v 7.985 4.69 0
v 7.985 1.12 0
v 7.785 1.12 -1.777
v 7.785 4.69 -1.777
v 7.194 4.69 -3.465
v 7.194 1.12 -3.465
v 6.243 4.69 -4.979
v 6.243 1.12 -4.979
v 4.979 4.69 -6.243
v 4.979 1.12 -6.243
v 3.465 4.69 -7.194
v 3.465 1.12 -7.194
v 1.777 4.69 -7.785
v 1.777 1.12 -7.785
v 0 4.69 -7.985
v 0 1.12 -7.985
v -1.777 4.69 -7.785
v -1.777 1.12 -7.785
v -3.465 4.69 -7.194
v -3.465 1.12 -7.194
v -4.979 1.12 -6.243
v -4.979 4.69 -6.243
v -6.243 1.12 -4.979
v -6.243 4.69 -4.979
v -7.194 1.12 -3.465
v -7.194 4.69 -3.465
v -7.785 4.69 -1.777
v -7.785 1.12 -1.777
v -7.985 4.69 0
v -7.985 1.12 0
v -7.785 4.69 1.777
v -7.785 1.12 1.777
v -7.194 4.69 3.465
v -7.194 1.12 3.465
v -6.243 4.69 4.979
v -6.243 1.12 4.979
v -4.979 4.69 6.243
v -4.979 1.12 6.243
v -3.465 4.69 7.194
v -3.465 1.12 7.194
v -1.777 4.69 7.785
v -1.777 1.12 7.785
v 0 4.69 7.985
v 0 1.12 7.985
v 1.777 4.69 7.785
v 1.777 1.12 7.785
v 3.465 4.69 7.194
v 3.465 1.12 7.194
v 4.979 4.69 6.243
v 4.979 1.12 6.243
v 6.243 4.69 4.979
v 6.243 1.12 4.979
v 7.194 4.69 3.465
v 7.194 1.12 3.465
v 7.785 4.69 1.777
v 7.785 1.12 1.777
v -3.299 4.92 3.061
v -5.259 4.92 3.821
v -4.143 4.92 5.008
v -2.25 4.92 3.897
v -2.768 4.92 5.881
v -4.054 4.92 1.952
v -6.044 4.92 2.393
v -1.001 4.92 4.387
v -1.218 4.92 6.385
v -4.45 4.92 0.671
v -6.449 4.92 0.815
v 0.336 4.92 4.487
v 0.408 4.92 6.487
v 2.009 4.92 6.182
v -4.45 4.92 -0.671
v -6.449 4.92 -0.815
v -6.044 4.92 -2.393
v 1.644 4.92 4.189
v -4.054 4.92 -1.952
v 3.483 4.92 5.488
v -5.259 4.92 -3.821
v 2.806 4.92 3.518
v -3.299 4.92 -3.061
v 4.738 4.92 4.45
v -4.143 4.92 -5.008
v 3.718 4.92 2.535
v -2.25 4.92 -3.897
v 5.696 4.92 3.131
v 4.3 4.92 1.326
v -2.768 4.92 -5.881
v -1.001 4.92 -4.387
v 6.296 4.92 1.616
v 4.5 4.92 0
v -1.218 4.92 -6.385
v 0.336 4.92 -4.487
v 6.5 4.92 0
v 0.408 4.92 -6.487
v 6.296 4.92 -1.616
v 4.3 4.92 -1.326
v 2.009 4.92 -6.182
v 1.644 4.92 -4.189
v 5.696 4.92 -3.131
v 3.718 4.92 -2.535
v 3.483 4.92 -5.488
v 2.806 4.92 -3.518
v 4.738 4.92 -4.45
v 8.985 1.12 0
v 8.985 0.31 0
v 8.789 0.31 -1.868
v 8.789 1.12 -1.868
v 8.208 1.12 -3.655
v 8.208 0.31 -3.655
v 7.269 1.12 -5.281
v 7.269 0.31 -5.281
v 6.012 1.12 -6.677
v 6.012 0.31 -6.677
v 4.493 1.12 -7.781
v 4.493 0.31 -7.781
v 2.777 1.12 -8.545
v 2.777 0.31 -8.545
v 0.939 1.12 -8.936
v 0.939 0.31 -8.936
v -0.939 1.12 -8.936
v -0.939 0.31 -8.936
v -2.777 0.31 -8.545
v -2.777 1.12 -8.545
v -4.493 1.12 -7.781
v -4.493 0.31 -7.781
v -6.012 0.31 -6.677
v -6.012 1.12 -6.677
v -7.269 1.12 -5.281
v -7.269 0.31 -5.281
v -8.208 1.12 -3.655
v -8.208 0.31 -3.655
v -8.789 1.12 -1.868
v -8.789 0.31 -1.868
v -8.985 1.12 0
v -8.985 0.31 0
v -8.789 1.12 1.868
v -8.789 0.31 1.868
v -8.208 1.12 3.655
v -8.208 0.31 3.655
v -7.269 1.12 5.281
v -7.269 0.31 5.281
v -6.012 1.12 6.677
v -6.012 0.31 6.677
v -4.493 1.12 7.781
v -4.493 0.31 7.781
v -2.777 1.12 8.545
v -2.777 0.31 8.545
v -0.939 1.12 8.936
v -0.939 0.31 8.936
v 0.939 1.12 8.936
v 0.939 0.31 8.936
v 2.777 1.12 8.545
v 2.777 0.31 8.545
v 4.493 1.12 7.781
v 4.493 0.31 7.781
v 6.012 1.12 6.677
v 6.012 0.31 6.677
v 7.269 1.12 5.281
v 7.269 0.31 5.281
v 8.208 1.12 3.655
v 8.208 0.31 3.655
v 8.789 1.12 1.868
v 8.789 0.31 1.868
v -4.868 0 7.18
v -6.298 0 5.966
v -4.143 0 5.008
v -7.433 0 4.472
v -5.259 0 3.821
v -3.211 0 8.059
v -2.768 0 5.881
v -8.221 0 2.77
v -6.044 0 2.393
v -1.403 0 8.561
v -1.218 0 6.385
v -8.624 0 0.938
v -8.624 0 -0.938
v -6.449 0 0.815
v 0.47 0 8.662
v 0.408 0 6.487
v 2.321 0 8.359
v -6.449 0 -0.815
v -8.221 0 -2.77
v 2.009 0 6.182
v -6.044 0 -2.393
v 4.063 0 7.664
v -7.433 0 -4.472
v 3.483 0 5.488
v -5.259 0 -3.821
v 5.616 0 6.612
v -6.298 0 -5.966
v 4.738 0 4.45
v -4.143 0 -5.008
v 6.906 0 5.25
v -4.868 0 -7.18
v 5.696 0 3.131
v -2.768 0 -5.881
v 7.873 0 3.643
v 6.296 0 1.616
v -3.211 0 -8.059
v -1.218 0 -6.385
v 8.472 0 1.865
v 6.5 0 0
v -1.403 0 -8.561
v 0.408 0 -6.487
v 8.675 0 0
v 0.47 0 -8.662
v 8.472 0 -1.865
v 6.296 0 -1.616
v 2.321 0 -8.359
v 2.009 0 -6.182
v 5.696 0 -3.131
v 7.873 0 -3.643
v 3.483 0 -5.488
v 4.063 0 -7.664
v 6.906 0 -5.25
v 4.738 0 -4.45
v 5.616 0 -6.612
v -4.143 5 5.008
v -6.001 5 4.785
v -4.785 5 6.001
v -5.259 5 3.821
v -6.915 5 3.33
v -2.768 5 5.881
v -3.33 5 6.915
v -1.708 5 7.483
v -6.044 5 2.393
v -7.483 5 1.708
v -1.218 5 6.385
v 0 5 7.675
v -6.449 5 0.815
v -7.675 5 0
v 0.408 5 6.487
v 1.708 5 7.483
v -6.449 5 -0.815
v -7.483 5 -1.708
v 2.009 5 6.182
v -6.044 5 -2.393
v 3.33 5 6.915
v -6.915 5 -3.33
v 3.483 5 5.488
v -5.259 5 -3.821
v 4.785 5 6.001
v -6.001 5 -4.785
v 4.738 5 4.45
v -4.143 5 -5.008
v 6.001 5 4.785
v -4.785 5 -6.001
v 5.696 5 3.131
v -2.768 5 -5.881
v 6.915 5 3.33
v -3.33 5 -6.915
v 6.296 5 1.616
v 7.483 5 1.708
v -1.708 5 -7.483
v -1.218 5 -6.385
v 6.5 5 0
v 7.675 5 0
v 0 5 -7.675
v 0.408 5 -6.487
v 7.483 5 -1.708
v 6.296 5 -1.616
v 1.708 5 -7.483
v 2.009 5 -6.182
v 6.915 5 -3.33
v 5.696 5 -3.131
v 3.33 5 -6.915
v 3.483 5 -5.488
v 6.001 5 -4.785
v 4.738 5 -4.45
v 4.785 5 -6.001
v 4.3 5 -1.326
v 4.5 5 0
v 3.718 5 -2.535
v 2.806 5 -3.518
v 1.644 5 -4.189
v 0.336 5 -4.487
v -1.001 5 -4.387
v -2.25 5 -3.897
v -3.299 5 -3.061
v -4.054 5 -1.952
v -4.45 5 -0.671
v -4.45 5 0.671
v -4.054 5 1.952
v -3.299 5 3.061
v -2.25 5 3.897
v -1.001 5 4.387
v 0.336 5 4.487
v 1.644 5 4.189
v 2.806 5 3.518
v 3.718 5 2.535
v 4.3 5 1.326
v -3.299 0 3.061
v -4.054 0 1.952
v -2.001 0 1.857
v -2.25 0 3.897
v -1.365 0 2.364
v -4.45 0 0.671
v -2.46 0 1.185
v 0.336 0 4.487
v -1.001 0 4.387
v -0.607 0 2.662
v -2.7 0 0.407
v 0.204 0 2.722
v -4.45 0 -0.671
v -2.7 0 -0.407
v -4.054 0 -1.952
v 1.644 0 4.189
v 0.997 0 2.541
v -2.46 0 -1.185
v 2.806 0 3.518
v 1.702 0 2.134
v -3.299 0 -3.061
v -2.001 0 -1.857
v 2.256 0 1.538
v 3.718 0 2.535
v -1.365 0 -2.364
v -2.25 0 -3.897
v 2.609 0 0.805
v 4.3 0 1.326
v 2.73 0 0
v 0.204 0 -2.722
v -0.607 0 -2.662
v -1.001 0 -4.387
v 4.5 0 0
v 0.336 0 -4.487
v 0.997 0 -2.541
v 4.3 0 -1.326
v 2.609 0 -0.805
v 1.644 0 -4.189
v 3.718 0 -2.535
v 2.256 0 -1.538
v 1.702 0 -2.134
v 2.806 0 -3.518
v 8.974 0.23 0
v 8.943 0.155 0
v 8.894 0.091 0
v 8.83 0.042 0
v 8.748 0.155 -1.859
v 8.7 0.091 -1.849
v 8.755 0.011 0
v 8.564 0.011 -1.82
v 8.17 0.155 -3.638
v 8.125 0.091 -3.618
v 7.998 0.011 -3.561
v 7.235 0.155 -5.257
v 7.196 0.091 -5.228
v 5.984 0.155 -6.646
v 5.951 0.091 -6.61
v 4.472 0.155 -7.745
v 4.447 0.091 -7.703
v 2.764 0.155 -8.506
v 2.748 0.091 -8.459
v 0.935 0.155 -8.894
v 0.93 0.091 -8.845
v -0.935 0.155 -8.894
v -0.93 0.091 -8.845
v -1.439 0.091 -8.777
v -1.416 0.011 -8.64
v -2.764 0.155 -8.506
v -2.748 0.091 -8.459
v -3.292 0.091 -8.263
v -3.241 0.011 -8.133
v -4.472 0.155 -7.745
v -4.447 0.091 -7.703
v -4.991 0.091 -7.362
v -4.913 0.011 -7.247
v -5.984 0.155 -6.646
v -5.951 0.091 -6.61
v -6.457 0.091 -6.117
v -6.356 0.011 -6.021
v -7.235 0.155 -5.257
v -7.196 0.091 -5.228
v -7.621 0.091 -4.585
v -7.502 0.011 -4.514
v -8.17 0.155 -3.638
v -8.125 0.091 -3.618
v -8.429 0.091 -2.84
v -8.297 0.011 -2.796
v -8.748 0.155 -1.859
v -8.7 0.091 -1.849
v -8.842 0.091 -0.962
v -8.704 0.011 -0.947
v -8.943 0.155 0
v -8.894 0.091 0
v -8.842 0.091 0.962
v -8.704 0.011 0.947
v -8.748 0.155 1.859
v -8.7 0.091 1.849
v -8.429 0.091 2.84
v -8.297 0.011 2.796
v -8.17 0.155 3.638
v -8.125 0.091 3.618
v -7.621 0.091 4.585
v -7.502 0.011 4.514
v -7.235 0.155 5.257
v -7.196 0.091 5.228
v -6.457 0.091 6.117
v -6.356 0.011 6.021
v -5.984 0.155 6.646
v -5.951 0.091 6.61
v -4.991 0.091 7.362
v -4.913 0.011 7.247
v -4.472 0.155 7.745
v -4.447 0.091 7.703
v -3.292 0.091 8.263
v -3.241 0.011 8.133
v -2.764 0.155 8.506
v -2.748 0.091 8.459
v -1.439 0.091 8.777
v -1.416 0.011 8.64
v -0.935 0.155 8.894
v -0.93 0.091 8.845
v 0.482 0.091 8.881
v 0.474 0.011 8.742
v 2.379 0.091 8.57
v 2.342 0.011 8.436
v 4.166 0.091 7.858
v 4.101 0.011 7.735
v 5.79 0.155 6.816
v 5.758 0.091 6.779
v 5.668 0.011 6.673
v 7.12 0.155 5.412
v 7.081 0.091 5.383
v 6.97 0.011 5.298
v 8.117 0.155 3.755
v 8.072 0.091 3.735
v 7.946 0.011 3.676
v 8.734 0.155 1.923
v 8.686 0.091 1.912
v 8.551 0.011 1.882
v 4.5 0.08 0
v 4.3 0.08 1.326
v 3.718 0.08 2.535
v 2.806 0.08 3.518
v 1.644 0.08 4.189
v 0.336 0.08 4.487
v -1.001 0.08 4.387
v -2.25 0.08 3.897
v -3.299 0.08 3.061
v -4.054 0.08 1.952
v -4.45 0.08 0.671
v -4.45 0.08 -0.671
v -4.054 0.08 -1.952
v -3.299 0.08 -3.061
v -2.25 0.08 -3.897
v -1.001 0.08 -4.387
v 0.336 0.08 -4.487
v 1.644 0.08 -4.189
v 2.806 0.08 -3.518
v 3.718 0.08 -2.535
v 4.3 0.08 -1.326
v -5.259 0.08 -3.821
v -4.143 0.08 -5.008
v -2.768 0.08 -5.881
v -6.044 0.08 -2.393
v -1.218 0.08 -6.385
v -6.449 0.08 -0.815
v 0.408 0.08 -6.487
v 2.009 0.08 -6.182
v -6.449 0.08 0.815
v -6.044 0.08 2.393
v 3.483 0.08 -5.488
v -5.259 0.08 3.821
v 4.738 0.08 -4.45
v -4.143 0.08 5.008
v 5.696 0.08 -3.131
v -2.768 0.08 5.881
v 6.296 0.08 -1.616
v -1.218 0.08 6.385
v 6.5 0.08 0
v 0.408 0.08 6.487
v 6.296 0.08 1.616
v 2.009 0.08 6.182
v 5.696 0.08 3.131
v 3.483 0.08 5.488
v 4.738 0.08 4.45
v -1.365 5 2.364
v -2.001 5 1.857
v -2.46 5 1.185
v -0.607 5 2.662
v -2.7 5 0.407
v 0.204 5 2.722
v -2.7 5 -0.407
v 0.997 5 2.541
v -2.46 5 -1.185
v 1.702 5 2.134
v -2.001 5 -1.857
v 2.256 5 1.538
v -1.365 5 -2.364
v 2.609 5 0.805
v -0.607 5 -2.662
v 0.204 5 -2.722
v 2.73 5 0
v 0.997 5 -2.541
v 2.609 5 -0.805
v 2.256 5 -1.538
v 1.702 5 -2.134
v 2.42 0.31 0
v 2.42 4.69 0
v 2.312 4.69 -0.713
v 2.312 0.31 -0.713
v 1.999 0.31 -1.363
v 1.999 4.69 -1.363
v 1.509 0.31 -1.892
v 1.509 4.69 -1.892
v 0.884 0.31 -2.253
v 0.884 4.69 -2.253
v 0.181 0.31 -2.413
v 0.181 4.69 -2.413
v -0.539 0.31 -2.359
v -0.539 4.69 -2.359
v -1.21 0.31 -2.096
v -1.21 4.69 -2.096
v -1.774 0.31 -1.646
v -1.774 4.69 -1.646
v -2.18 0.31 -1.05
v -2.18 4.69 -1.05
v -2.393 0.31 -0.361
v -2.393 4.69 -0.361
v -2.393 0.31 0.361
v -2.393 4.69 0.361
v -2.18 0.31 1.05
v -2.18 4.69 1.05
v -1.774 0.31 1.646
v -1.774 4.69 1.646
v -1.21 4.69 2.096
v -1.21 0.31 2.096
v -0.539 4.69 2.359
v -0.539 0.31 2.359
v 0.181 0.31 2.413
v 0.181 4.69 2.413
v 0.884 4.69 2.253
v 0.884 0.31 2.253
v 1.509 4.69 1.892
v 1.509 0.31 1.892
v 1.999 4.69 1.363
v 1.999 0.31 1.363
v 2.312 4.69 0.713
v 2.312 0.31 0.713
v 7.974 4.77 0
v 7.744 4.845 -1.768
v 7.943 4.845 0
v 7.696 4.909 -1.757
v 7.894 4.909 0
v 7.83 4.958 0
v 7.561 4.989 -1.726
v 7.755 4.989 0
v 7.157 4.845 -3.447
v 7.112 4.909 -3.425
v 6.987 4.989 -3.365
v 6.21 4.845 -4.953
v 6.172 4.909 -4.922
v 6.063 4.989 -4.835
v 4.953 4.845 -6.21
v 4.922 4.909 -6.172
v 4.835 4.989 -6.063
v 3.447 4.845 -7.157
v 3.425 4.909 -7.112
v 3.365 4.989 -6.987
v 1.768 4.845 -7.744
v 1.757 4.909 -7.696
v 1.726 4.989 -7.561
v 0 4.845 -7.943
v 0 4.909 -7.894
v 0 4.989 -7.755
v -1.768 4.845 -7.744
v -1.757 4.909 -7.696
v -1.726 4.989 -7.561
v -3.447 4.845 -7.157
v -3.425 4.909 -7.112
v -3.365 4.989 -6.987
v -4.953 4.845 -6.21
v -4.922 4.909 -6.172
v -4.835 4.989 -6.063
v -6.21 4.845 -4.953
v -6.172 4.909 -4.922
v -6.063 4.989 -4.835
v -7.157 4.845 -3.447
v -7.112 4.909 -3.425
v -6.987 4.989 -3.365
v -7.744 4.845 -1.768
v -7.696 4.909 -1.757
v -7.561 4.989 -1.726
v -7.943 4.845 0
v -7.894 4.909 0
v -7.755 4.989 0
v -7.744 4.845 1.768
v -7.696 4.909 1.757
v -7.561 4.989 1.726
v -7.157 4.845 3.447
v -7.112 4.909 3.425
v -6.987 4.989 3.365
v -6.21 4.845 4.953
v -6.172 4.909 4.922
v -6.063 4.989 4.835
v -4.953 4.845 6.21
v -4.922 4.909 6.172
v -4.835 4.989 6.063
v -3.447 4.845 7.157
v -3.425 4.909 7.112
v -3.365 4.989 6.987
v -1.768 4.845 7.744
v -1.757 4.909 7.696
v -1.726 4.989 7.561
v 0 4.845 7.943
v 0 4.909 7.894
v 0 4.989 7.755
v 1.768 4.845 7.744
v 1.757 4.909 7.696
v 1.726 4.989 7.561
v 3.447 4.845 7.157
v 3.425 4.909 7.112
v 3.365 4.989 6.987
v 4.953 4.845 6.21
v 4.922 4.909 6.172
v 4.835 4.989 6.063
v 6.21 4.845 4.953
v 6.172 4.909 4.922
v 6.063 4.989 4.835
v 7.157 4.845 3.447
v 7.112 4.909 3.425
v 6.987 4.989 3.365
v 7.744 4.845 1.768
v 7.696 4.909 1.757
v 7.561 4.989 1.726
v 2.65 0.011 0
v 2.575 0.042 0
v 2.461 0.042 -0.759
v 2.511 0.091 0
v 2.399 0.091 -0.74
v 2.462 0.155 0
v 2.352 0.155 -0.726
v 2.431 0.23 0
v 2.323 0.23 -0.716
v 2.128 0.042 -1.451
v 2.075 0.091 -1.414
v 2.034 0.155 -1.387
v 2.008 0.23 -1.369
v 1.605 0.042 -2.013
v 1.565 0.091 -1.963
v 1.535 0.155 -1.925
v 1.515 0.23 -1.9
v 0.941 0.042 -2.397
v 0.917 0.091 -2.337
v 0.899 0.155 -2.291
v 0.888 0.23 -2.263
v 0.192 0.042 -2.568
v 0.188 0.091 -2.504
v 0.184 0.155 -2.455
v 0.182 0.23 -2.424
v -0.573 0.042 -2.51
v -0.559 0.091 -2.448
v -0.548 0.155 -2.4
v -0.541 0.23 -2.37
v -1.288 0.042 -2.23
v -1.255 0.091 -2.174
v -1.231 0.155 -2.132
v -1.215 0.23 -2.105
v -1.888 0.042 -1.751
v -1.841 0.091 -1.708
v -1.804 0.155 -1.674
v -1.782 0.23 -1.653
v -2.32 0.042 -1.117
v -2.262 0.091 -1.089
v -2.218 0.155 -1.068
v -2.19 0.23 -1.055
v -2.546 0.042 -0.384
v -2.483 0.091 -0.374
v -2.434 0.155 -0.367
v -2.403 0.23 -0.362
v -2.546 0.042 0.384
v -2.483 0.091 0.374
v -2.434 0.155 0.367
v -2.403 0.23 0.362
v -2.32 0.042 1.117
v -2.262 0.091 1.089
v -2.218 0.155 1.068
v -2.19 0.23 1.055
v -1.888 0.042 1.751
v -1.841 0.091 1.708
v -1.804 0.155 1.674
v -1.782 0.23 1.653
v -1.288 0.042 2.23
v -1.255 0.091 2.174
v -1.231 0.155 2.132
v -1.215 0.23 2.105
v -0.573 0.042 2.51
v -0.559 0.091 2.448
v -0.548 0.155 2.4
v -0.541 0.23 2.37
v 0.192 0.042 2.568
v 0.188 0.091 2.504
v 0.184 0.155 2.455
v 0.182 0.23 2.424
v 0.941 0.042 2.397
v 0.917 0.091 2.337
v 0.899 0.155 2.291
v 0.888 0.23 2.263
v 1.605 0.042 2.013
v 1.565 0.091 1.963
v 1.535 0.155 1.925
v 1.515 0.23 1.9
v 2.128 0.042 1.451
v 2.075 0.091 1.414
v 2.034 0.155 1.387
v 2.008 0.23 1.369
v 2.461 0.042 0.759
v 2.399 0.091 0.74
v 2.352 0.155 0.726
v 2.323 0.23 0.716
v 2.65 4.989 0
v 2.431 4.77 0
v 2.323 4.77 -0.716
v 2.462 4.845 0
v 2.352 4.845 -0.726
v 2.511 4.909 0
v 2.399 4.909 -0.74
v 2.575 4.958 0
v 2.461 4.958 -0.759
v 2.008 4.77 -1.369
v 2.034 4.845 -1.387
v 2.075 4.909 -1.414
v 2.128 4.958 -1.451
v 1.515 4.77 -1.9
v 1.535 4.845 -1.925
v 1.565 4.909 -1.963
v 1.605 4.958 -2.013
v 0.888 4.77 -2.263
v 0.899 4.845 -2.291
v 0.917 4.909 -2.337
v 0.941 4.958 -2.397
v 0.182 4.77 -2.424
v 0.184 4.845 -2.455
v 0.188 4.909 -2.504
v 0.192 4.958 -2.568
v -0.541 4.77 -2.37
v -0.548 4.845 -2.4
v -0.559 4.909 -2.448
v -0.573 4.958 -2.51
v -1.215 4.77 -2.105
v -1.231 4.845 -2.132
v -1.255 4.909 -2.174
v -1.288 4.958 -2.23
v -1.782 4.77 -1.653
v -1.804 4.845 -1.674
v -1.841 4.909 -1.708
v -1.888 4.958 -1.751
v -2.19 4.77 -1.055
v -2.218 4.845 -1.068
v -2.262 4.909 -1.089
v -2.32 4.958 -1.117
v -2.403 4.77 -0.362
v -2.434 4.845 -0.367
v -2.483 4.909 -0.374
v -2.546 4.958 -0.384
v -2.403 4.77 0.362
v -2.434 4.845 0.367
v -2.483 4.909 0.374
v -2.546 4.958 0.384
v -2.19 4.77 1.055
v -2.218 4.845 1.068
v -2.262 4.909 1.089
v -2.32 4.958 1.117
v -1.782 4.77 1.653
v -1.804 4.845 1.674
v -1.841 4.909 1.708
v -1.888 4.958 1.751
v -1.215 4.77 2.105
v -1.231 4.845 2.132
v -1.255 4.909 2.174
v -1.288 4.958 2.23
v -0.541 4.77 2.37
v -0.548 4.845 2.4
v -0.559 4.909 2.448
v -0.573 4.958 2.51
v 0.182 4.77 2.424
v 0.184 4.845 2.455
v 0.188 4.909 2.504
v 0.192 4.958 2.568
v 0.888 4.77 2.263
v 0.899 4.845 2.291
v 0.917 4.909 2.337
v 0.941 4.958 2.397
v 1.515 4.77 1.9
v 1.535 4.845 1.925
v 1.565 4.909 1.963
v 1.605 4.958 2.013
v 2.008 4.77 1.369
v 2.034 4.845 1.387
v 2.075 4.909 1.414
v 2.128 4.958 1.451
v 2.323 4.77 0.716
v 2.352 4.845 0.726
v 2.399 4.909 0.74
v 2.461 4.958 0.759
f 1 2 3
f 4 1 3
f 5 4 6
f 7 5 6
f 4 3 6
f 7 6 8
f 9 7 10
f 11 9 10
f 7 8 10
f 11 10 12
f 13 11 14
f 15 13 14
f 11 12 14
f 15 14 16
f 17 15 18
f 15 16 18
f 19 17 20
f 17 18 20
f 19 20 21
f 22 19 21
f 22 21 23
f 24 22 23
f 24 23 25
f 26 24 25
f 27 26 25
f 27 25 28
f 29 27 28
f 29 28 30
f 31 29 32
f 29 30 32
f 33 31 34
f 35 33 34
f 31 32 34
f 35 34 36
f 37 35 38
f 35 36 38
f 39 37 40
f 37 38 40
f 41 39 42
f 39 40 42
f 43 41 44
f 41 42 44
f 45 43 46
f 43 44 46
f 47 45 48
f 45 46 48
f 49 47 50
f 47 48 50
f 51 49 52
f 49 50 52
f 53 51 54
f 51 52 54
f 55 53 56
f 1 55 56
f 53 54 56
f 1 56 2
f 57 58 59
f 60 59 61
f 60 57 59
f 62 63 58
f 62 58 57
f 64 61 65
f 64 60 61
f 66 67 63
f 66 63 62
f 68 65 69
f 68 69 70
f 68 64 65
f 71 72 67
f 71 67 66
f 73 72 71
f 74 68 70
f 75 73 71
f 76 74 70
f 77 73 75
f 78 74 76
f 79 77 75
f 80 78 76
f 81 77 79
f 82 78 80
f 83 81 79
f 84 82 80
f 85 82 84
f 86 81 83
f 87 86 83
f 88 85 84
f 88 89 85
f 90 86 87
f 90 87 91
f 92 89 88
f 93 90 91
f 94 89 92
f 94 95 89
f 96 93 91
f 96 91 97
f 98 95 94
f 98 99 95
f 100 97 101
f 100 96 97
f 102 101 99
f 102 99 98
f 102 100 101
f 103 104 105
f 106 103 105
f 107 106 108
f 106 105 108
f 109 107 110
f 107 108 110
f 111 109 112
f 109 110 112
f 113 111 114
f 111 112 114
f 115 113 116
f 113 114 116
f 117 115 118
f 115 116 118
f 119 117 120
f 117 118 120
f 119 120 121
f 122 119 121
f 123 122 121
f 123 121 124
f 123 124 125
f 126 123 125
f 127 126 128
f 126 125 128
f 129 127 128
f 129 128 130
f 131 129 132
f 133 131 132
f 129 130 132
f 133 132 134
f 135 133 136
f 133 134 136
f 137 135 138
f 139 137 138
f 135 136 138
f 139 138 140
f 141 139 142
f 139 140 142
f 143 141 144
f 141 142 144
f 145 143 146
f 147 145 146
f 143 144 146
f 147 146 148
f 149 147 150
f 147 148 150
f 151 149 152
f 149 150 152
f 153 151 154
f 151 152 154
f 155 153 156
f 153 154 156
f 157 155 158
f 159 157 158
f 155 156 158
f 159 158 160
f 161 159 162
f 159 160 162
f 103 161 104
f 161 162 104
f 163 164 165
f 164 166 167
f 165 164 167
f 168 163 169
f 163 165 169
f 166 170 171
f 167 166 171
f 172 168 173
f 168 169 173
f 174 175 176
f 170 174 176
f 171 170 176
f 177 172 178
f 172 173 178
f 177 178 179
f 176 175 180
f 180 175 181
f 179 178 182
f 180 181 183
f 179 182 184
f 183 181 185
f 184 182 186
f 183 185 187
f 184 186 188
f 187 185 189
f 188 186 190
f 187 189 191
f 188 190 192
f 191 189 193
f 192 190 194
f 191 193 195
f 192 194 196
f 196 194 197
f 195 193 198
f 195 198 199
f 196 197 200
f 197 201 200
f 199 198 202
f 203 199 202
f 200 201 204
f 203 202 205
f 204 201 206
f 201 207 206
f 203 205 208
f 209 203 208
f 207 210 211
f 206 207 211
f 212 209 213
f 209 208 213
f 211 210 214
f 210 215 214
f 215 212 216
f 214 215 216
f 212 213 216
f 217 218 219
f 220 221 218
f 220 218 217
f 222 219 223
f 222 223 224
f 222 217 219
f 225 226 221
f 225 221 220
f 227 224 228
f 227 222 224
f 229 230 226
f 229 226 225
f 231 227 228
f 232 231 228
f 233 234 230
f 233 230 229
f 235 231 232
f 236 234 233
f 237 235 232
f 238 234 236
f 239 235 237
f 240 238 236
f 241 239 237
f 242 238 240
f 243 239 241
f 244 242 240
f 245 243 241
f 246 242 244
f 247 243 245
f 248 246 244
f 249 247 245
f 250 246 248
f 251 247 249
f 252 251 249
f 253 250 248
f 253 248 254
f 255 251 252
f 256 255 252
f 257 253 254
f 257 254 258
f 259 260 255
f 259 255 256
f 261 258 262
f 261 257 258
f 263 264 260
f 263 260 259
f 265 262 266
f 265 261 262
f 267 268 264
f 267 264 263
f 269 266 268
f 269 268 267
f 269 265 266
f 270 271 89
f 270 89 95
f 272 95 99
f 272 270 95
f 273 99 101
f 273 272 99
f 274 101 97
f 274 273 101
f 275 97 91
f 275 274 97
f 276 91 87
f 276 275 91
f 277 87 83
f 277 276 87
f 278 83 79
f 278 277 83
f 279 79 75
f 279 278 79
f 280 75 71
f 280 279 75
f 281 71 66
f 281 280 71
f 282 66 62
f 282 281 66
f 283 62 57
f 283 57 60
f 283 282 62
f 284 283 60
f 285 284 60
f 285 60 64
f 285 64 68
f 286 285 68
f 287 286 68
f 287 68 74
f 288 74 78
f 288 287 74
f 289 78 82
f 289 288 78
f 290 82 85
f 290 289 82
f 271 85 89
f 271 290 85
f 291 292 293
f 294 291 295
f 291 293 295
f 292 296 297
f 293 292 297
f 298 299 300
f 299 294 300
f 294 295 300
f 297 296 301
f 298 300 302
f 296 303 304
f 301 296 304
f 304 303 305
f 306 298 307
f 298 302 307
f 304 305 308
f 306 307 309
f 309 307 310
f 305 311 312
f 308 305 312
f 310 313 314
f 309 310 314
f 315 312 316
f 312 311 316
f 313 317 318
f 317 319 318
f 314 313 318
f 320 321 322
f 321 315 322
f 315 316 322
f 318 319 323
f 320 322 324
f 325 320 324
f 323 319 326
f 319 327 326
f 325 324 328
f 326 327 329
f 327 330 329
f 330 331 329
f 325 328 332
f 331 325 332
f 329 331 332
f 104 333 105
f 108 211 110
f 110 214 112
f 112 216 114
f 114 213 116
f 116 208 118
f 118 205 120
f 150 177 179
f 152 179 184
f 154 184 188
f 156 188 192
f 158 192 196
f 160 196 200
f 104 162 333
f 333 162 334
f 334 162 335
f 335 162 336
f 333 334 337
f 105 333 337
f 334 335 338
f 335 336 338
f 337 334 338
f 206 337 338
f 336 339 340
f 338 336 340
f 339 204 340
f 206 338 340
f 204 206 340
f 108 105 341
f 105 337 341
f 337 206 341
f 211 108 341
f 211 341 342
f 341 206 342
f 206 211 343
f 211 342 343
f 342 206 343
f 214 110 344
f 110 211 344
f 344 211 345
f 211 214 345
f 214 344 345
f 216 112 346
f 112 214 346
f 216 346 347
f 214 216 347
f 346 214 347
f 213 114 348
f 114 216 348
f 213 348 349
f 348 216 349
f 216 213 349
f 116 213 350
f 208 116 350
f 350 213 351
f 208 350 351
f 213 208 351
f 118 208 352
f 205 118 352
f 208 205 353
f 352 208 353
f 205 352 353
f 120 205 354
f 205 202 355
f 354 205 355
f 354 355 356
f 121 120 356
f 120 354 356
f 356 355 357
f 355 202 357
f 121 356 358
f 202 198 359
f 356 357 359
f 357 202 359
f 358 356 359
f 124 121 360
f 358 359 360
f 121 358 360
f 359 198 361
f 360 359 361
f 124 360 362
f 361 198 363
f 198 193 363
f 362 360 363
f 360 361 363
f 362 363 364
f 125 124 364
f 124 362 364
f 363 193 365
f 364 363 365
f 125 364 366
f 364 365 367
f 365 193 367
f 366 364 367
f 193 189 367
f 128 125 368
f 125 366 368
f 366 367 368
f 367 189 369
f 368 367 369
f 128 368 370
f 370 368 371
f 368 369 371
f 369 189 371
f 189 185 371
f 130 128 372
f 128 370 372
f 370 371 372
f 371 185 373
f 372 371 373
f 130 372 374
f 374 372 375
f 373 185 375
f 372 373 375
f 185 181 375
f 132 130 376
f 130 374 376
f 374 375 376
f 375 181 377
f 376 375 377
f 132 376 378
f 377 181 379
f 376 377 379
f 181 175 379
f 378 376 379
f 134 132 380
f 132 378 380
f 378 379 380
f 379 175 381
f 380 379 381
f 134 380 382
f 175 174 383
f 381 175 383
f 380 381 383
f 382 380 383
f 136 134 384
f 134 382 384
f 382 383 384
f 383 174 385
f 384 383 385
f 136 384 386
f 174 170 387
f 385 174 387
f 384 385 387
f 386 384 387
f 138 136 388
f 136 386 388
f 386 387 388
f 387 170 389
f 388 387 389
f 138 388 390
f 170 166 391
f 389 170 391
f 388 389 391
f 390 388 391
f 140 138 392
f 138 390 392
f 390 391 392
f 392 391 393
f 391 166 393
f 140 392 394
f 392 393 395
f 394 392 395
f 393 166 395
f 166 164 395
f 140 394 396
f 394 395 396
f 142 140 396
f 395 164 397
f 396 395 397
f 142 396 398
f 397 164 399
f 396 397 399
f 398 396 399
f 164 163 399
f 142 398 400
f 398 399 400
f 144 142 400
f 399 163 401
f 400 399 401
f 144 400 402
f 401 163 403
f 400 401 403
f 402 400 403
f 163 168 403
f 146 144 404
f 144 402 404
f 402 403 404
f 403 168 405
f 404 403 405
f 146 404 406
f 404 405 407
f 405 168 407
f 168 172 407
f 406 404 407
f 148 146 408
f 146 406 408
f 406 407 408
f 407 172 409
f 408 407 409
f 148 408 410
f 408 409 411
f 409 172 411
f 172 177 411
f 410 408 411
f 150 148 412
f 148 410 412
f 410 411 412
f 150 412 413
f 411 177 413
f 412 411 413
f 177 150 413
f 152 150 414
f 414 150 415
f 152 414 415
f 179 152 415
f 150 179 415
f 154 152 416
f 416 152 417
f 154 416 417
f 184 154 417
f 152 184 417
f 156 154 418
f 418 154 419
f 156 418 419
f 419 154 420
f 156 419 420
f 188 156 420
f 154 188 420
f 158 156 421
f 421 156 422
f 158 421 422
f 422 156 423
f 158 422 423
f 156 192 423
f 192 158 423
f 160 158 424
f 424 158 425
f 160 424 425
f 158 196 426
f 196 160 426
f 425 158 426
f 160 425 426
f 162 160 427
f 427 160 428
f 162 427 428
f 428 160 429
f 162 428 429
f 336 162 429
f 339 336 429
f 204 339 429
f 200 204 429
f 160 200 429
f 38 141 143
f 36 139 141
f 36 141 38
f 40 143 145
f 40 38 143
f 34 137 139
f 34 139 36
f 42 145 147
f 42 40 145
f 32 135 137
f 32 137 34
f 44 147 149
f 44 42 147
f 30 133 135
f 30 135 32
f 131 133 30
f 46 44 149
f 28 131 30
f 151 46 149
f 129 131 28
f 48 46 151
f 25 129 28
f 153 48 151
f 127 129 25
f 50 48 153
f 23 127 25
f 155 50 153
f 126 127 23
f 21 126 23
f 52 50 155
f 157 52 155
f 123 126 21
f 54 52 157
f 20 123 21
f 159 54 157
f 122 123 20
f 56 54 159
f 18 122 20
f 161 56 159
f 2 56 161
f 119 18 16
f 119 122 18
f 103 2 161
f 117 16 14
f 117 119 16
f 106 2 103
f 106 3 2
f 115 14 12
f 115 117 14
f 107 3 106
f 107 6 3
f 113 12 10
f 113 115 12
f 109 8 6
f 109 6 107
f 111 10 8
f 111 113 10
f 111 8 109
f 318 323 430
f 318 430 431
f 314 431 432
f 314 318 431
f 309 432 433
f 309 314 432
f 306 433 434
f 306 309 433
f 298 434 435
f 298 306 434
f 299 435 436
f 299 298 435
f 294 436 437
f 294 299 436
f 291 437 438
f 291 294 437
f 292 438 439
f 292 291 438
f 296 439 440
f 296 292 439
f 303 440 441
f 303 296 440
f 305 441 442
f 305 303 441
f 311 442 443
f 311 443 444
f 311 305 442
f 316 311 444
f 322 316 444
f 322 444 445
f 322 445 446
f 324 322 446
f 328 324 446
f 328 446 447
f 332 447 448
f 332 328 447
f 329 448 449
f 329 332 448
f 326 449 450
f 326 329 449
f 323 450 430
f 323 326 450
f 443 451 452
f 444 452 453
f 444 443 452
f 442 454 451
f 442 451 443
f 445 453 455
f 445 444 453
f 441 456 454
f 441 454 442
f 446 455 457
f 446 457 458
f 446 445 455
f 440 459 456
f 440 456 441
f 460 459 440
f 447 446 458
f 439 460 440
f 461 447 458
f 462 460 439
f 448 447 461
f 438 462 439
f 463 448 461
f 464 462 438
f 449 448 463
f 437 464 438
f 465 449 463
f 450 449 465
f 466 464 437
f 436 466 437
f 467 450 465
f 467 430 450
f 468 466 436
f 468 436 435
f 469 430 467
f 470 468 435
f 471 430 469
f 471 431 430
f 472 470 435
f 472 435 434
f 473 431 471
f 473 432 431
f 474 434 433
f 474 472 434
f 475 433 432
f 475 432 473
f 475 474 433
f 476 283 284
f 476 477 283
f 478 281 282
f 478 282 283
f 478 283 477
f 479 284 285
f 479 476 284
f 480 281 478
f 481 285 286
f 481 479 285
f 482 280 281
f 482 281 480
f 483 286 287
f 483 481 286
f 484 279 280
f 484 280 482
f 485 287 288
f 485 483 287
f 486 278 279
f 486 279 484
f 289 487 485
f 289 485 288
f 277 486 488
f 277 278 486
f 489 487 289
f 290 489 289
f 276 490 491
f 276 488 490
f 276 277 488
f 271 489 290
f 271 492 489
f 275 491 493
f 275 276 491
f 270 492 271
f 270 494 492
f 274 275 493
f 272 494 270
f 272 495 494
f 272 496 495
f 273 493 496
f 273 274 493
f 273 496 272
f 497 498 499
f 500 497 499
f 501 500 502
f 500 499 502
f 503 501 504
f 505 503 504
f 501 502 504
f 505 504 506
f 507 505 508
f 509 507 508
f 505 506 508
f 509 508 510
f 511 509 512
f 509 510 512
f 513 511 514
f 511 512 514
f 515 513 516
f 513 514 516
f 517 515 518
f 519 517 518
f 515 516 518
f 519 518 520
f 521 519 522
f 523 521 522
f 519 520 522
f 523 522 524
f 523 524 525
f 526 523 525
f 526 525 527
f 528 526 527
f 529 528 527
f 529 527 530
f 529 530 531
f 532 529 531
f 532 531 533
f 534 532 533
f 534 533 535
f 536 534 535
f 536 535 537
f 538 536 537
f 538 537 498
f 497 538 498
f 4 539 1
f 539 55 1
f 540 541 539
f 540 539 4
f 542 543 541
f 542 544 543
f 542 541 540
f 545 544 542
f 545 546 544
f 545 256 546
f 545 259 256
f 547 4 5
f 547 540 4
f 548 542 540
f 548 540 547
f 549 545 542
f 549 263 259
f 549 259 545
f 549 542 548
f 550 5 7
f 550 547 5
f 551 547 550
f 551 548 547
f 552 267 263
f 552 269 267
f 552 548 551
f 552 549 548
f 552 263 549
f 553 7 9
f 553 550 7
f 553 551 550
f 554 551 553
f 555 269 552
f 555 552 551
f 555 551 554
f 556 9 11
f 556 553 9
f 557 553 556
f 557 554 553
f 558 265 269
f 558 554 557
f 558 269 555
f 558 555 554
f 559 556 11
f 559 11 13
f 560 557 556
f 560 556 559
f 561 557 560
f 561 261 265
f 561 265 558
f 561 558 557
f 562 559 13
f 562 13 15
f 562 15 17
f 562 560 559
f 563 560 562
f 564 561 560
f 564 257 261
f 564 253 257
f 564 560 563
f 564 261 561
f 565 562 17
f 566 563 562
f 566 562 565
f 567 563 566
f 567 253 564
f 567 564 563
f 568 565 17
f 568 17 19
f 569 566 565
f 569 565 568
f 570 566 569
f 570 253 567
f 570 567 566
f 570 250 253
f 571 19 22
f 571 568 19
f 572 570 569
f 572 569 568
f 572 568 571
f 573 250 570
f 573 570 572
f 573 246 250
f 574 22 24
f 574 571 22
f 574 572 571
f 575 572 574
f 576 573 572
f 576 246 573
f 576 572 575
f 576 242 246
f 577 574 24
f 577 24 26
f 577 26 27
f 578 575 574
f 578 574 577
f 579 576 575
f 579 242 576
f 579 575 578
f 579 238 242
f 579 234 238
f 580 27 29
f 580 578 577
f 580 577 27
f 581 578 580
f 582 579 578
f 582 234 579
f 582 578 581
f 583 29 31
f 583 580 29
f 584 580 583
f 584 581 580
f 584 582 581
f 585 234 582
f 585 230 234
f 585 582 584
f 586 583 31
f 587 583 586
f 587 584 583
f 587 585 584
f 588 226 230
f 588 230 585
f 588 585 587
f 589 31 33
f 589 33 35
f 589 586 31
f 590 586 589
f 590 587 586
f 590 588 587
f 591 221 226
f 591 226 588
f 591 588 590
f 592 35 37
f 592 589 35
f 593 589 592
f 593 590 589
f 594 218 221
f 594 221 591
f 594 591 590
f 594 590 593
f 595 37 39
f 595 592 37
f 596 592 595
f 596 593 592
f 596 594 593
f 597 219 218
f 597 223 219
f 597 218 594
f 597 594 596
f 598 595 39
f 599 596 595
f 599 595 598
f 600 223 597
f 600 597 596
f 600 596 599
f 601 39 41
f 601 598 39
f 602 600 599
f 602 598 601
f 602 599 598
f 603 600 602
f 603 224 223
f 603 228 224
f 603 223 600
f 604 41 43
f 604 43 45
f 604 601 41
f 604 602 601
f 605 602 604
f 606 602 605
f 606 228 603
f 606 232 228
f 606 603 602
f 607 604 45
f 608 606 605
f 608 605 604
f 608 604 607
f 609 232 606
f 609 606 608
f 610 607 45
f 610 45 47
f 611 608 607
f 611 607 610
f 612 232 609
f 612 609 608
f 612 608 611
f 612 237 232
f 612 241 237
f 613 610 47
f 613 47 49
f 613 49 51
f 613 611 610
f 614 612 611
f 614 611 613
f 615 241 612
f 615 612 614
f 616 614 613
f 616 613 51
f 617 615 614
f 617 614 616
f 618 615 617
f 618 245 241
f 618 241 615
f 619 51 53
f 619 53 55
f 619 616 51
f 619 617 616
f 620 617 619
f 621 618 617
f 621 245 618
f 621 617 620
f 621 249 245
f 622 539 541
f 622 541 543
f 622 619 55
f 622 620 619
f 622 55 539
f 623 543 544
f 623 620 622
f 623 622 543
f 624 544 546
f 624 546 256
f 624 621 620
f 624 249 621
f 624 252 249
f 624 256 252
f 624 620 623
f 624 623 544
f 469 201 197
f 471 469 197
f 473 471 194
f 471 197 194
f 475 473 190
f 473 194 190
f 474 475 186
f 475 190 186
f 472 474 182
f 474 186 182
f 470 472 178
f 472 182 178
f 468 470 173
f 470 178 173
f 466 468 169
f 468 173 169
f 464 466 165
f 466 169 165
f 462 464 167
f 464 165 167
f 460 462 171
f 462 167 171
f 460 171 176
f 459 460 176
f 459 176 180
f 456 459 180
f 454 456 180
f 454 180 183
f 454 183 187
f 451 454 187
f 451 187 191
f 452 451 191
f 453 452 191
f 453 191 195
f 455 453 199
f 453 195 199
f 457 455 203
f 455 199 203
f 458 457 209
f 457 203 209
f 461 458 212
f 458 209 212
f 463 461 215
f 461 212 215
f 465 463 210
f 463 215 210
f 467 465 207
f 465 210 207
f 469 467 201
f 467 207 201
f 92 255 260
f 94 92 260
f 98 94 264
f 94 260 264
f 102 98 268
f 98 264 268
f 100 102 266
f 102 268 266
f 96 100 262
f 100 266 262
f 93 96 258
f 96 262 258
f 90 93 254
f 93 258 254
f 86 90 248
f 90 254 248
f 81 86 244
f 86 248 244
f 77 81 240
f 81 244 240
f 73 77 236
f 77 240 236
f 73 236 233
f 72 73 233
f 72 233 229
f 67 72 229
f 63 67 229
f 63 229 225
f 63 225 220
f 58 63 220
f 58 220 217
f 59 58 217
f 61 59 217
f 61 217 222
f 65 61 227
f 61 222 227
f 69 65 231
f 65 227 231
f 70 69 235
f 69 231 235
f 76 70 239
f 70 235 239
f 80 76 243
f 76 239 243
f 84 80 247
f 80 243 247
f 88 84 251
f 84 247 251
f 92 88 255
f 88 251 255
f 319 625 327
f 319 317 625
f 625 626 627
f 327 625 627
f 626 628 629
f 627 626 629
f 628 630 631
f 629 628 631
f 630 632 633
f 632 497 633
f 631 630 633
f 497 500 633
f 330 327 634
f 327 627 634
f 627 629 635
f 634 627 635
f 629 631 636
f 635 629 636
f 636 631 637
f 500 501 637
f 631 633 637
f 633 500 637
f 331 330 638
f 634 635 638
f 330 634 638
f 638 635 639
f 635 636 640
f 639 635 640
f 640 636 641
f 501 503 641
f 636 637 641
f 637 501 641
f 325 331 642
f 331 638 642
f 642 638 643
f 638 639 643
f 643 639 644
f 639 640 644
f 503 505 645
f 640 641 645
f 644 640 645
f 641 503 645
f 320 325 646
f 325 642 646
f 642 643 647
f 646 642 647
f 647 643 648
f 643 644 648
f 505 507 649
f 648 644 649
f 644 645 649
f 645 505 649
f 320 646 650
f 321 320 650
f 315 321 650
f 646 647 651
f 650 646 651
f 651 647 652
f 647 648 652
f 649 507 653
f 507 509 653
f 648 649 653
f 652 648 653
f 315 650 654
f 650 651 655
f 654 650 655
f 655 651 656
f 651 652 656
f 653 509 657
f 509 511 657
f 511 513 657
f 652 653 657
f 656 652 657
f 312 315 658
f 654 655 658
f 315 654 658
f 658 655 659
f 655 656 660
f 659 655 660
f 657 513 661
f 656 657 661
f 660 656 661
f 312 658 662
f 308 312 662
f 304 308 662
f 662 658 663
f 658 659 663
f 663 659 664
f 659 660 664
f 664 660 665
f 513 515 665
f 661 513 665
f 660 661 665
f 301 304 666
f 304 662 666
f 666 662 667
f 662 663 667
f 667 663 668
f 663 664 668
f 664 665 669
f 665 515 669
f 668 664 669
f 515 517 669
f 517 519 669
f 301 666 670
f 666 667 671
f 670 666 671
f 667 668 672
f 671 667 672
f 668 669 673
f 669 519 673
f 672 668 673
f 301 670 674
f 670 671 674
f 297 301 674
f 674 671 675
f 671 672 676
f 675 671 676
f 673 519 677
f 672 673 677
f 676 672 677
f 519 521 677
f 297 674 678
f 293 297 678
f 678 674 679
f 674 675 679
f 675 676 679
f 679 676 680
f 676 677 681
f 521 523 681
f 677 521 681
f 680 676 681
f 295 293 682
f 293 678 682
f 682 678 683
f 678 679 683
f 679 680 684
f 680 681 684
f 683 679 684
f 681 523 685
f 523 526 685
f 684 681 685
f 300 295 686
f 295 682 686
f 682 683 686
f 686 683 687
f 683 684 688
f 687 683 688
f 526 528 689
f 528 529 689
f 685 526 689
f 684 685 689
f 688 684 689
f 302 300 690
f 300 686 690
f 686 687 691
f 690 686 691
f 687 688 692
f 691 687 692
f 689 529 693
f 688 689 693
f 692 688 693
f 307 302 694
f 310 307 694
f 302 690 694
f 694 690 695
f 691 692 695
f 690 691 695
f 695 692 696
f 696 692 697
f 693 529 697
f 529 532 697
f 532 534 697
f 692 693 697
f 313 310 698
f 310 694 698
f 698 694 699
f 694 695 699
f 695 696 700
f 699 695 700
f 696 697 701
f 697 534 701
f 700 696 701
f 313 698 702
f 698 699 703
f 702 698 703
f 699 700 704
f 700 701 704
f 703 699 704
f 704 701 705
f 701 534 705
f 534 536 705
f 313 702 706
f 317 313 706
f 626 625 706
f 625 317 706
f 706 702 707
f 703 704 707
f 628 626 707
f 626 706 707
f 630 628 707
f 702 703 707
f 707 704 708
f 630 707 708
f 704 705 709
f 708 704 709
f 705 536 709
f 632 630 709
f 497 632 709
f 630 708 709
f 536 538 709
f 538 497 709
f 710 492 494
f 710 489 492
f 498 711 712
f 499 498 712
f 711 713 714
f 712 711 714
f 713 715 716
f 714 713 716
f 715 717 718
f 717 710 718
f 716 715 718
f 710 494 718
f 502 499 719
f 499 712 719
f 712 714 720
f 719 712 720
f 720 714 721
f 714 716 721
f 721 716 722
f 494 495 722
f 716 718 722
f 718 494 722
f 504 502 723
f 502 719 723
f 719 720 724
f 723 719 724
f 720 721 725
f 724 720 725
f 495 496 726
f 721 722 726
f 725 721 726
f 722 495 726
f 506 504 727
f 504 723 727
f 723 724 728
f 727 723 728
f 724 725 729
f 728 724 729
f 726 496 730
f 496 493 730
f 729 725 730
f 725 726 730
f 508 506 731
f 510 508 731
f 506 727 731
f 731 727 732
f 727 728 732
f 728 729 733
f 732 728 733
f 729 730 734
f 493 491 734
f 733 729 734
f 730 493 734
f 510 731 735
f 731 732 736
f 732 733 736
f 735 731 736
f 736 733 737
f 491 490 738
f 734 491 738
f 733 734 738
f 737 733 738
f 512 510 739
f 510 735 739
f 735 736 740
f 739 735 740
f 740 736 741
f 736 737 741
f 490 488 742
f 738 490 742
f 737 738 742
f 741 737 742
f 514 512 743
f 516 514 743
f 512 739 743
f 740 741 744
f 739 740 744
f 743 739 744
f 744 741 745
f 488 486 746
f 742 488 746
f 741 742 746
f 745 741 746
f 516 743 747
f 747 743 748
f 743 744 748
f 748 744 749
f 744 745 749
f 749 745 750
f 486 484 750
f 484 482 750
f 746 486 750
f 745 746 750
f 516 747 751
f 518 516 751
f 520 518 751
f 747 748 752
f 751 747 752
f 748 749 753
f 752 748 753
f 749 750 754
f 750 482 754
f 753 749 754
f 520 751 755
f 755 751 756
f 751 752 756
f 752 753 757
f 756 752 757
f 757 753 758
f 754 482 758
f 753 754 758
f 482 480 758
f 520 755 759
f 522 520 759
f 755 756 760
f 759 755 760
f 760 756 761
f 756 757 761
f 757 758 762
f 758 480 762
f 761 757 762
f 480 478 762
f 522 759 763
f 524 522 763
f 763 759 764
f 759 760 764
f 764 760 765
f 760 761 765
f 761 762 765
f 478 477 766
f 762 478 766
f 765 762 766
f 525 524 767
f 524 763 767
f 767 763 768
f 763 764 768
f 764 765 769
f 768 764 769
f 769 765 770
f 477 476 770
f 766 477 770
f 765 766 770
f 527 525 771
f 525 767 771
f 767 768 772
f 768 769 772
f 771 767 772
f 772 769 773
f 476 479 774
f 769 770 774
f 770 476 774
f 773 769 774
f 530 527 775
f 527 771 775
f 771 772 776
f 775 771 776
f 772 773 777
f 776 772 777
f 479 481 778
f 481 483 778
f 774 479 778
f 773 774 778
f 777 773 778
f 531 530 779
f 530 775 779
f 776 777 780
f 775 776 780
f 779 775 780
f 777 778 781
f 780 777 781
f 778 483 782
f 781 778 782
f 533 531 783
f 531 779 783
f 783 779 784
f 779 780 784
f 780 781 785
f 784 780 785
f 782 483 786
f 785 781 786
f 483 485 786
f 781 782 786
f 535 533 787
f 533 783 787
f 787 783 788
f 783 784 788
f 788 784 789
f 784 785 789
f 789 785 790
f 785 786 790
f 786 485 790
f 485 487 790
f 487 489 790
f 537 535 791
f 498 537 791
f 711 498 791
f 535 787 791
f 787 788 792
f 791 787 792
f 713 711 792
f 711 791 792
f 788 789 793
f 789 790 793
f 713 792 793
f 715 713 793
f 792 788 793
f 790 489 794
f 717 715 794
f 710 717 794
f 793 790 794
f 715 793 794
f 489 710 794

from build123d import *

# Parameters (mm, degrees)
SKETCH1_R           = 8.985
BOSS_EXTRUDE1_DEPTH = 1.12
SKETCH2_R           = 7.985
BOSS_EXTRUDE2_DEPTH = 3.88
SKETCH3_R           = 2.42
CUT_EXTRUDE1_DEPTH  = 6
SKETCH4_R           = 6.5
SKETCH4_R_2         = 4.5
CUT_EXTRUDE2_DEPTH  = 0.08
SKETCH5_R           = 6.5
SKETCH5_R_2         = 4.5
CUT_EXTRUDE3_DEPTH  = 0.08
FILLET1_R           = 0.31


with BuildPart() as part:
    # Sketch1 → Boss-Extrude1 (new body)
    with BuildSketch(Plane(origin=(0, 0, 0), x_dir=(1, 0, 0), z_dir=(0, 1, 0))):
        Circle(SKETCH1_R)
    extrude(amount=BOSS_EXTRUDE1_DEPTH)

    # Sketch2 → Boss-Extrude2 (add)
    with BuildSketch(Plane(origin=(0, 1.12, 0), x_dir=(1, 0, 0), z_dir=(0, 1, 0))):
        Circle(SKETCH2_R)
    extrude(amount=BOSS_EXTRUDE2_DEPTH)

    # Sketch3 → Cut-Extrude1 (cut, through all)
    with BuildSketch(Plane(origin=(0, 5, 0), x_dir=(1, 0, 0), z_dir=(0, 1, 0))):
        Circle(SKETCH3_R)
    extrude(amount=-CUT_EXTRUDE1_DEPTH, mode=Mode.SUBTRACT)

    # Sketch4 → Cut-Extrude2 (cut)
    with BuildSketch(Plane.XZ):
        Circle(SKETCH4_R)
        Circle(SKETCH4_R_2, mode=Mode.SUBTRACT)
    extrude(amount=-CUT_EXTRUDE2_DEPTH, mode=Mode.SUBTRACT)

    # Sketch5 → Cut-Extrude3 (cut)
    with BuildSketch(Plane(origin=(0, 5, 0), x_dir=(1, 0, 0), z_dir=(0, 1, 0))):
        Circle(SKETCH5_R)
        Circle(SKETCH5_R_2, mode=Mode.SUBTRACT)
    extrude(amount=-CUT_EXTRUDE3_DEPTH, mode=Mode.SUBTRACT)

    # Fillet1
    fillet1_edges = [part.edges().sort_by_distance(p)[0] for p in [
        (-2.42, 0, 0),
        (-2.42, 5, 0),
        (-8.985, 0, 0),
        (-7.985, 5, 0),
    ]]
    fillet(fillet1_edges, radius=FILLET1_R)


solid = part.part
